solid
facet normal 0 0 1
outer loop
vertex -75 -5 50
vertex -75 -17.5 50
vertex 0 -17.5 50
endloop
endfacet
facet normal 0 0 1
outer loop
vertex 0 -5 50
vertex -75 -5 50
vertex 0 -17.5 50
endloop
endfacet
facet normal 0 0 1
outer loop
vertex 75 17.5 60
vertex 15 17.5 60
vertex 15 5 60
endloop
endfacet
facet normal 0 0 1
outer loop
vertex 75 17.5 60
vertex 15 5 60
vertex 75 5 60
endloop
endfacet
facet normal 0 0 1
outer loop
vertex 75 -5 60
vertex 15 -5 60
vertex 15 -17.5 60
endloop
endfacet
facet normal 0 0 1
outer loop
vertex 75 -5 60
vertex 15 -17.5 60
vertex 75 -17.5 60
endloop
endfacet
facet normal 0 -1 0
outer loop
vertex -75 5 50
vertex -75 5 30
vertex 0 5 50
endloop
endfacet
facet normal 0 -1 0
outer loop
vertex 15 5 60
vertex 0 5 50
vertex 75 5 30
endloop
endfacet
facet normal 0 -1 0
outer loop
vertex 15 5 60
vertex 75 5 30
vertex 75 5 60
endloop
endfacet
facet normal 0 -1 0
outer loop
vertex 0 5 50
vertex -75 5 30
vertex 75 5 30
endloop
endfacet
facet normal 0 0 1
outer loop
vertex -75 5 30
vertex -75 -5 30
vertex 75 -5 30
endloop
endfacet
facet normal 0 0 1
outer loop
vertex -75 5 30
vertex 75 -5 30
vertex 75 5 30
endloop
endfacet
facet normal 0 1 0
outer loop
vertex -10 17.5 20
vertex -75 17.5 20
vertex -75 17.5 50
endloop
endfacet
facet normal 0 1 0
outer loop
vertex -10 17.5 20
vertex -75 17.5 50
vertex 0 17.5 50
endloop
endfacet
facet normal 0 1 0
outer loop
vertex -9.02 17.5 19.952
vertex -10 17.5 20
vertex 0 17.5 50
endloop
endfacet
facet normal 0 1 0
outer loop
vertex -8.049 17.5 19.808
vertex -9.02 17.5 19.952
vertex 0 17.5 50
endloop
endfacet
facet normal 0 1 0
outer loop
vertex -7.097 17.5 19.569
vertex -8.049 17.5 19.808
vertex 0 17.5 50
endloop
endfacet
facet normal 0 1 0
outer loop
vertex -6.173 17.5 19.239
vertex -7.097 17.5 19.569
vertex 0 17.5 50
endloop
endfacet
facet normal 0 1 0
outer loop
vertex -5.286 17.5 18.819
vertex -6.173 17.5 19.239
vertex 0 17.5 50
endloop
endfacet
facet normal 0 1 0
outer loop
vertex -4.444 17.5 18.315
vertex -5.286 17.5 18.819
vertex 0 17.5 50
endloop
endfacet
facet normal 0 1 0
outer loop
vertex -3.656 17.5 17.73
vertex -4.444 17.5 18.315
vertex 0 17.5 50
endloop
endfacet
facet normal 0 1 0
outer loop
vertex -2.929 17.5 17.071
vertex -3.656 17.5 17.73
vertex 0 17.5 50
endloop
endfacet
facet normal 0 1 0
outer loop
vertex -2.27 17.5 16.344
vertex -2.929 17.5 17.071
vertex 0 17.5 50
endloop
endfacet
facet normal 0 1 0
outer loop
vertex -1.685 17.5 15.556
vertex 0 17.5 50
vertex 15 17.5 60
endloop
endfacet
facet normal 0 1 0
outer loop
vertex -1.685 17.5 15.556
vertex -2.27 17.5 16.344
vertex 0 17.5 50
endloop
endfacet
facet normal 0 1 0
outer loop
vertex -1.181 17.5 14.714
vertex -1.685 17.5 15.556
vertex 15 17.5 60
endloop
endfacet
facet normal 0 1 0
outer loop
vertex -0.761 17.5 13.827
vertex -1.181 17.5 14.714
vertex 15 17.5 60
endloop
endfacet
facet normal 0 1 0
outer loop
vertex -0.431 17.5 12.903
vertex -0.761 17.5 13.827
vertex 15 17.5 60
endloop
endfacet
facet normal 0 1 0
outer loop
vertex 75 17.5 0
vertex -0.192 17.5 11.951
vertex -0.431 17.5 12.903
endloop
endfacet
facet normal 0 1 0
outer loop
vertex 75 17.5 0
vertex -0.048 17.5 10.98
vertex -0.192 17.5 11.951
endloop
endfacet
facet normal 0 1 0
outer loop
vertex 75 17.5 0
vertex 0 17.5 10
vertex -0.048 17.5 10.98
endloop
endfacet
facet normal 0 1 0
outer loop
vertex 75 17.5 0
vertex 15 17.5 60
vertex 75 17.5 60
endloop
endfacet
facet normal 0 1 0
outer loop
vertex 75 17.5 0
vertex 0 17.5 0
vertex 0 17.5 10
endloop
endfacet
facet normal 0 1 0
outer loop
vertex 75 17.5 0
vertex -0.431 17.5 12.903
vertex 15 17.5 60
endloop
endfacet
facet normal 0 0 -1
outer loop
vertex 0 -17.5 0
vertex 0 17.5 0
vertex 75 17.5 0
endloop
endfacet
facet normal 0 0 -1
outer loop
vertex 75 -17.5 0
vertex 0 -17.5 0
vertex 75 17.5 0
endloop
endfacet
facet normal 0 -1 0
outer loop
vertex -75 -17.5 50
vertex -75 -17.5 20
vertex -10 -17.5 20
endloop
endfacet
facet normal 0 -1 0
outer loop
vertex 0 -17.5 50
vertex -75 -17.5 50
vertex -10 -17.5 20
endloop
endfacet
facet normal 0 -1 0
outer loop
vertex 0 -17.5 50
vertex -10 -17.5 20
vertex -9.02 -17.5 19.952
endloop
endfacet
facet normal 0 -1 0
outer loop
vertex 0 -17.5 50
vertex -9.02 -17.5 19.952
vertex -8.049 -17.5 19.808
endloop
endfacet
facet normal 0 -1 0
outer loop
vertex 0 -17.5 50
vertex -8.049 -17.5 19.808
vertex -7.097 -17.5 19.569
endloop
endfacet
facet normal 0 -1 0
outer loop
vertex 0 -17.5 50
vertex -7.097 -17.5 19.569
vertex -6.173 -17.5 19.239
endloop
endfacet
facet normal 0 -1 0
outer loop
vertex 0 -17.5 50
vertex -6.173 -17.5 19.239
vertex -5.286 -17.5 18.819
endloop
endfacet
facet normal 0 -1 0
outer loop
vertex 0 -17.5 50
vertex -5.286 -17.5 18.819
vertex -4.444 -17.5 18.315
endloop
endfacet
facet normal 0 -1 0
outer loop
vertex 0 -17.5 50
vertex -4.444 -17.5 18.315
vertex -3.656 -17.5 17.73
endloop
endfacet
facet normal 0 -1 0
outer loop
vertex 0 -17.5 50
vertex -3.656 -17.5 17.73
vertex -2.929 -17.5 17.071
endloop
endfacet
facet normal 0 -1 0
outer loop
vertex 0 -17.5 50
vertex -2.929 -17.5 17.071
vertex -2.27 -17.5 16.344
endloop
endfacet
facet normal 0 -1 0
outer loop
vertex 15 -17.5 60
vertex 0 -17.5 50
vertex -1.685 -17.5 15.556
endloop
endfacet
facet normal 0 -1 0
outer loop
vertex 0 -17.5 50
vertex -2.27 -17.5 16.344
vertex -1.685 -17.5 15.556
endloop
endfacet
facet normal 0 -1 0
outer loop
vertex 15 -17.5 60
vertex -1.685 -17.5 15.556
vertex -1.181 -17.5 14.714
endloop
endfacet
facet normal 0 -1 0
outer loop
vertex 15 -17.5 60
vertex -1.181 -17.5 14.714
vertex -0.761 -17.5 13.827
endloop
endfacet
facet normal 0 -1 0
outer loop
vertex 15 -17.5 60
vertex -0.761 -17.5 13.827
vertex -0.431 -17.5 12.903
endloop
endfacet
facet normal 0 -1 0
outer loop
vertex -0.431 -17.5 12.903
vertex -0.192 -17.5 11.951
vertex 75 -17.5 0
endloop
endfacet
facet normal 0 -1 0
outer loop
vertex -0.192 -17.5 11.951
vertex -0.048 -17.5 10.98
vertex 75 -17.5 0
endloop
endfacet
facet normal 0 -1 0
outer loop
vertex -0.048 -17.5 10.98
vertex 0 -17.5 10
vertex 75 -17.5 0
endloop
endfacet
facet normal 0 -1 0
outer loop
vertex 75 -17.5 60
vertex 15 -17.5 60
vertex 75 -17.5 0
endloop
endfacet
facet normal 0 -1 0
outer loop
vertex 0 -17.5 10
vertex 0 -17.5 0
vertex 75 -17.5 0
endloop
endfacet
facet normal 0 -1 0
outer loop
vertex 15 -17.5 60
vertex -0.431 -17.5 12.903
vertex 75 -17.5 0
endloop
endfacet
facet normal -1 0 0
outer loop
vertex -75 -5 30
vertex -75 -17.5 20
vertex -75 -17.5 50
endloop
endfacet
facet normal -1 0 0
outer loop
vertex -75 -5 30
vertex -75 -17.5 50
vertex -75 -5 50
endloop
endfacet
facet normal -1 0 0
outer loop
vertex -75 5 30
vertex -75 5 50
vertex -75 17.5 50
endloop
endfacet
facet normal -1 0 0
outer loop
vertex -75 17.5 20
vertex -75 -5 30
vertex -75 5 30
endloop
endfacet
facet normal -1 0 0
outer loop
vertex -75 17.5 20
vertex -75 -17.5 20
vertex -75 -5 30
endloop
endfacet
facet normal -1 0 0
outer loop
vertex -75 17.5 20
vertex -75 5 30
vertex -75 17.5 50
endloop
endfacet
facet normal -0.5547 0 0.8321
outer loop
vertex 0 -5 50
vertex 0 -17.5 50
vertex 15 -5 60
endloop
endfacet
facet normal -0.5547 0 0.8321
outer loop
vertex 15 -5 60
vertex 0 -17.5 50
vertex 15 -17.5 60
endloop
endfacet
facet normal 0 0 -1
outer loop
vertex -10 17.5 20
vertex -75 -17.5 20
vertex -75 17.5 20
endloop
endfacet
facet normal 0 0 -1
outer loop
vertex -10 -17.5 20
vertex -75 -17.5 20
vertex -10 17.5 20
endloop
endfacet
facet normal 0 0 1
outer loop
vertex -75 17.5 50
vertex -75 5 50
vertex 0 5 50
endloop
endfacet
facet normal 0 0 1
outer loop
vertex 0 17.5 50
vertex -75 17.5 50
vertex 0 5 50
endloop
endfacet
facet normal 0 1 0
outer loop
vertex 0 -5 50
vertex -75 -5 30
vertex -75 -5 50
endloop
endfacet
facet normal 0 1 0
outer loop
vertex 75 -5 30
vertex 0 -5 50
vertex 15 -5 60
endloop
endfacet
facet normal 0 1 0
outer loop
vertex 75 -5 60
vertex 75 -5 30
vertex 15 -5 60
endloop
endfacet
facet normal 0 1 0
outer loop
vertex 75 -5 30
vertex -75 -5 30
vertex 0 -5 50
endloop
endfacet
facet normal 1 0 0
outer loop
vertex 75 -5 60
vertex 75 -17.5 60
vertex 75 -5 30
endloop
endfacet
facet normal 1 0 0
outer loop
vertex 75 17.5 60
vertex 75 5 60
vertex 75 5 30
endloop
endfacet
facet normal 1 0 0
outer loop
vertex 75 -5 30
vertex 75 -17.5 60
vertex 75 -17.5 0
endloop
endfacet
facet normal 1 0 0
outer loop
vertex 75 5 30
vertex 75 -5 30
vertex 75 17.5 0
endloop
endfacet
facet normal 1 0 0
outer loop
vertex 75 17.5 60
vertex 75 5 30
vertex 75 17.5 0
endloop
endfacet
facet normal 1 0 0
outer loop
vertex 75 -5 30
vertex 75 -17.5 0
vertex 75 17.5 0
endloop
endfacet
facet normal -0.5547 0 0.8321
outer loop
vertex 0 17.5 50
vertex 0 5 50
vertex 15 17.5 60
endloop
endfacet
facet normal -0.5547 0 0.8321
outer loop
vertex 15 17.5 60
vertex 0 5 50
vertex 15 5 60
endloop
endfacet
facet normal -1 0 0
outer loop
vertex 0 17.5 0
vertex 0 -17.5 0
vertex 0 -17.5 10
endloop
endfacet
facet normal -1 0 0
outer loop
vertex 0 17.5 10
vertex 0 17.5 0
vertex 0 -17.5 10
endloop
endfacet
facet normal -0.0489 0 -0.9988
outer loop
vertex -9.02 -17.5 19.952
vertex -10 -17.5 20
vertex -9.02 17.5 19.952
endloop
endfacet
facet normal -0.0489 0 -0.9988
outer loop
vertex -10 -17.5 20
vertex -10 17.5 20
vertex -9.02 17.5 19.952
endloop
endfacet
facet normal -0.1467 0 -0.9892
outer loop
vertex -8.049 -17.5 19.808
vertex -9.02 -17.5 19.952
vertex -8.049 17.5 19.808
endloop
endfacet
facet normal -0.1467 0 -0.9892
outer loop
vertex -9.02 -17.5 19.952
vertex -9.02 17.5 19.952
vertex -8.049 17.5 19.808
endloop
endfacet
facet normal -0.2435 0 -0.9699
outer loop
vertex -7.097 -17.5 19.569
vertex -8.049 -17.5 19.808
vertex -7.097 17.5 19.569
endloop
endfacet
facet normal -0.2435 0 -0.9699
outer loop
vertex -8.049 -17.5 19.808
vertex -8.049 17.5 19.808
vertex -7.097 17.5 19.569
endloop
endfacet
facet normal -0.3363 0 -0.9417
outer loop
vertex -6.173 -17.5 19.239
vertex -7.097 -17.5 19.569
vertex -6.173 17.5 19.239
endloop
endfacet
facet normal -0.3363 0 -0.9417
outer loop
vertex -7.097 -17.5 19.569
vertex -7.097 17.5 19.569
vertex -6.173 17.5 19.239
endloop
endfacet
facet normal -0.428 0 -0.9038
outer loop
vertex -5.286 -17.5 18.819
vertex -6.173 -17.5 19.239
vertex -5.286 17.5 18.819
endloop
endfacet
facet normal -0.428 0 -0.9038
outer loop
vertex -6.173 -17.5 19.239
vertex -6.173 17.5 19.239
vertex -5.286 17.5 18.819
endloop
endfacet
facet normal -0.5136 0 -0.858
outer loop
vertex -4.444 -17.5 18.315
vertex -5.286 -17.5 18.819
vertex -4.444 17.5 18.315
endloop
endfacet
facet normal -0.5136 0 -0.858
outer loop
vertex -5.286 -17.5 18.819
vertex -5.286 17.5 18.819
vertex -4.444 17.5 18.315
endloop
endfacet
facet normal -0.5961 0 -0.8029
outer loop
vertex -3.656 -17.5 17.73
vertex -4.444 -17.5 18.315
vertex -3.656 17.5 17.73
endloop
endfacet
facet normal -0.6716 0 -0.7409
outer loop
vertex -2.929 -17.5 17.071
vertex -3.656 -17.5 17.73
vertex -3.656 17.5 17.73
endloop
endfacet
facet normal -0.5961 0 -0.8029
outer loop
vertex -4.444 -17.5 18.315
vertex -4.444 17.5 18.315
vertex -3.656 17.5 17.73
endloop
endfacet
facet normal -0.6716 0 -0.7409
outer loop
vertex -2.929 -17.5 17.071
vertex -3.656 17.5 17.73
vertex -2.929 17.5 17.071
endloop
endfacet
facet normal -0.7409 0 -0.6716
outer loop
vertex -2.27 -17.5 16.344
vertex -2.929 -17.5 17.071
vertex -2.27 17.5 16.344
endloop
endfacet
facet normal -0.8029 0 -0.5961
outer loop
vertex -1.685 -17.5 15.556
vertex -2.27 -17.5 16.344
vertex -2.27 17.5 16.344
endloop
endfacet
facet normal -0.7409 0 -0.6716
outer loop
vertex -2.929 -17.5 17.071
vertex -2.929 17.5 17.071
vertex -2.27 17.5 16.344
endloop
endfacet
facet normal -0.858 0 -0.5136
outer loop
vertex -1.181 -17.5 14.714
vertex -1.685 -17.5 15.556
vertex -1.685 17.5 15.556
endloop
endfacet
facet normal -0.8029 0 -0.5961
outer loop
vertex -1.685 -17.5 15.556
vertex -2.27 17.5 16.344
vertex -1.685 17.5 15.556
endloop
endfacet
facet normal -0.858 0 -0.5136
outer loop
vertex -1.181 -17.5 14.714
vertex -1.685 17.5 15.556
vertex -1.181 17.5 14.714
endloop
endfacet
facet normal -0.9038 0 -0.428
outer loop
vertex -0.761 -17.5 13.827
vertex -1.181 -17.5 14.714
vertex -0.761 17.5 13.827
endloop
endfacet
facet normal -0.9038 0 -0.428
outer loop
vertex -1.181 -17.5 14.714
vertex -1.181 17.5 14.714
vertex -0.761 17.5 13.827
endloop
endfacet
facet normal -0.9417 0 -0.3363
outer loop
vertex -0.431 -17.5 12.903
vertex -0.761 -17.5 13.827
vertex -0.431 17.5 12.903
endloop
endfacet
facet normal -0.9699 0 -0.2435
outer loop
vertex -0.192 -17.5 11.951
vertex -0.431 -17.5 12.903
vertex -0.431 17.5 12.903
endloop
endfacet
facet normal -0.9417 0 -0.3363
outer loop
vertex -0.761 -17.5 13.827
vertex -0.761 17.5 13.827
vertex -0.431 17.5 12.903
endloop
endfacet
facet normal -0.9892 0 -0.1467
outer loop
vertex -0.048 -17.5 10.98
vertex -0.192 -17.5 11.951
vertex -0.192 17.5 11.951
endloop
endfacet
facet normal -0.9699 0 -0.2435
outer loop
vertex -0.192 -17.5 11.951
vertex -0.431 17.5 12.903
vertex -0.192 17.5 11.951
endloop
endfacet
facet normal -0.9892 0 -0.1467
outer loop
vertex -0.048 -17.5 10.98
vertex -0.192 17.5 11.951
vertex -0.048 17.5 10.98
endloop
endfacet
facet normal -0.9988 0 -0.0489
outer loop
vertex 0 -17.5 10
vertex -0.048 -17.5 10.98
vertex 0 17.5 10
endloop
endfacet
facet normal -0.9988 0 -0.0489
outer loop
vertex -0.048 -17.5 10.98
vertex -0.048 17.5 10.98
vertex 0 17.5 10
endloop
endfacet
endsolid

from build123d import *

# Parameters (mm, degrees)
F0_W     = 150
F0_H     = 35
F1_DEPTH = 60
F2_W     = 10
F2_H     = 30
F3_DEPTH = 150
F4_W     = 75
F4_H     = 20
F5_DEPTH = 35.001
F6_R     = 10
F8_DEPTH = 35.001


with BuildPart() as f1:
    # F0 (on Top) → F1 (new body)
    with BuildSketch(Plane.XY):
        Rectangle(F0_W, F0_H)
    extrude(amount=F1_DEPTH)

    # F2 (on face) → F3 (cut)
    with BuildSketch(Plane.YZ.offset(75)):
        with Locations((0, 45)):
            Rectangle(F2_W, F2_H)
    extrude(amount=-F3_DEPTH, mode=Mode.SUBTRACT)

    # F4 (on face) → F5 (cut, through all)
    with BuildSketch(Plane.XZ.offset(17.5)):
        with Locations((-37.5, 10)):
            Rectangle(F4_W, F4_H)
    extrude(amount=-F5_DEPTH, mode=Mode.SUBTRACT)

    # F6
    f6_edges = [f1.edges().sort_by_distance(p)[0] for p in [
        (0, 0, 20),
    ]]
    fillet(f6_edges, radius=F6_R)

    # F7 (on face) → F8 (cut, through all)
    with BuildSketch(Plane.XZ.offset(17.5)):
        Polygon((15, 60), (-75, 60), (-75, 50), (0, 50), align=None)
    extrude(amount=-F8_DEPTH, mode=Mode.SUBTRACT)


solid = f1.part
